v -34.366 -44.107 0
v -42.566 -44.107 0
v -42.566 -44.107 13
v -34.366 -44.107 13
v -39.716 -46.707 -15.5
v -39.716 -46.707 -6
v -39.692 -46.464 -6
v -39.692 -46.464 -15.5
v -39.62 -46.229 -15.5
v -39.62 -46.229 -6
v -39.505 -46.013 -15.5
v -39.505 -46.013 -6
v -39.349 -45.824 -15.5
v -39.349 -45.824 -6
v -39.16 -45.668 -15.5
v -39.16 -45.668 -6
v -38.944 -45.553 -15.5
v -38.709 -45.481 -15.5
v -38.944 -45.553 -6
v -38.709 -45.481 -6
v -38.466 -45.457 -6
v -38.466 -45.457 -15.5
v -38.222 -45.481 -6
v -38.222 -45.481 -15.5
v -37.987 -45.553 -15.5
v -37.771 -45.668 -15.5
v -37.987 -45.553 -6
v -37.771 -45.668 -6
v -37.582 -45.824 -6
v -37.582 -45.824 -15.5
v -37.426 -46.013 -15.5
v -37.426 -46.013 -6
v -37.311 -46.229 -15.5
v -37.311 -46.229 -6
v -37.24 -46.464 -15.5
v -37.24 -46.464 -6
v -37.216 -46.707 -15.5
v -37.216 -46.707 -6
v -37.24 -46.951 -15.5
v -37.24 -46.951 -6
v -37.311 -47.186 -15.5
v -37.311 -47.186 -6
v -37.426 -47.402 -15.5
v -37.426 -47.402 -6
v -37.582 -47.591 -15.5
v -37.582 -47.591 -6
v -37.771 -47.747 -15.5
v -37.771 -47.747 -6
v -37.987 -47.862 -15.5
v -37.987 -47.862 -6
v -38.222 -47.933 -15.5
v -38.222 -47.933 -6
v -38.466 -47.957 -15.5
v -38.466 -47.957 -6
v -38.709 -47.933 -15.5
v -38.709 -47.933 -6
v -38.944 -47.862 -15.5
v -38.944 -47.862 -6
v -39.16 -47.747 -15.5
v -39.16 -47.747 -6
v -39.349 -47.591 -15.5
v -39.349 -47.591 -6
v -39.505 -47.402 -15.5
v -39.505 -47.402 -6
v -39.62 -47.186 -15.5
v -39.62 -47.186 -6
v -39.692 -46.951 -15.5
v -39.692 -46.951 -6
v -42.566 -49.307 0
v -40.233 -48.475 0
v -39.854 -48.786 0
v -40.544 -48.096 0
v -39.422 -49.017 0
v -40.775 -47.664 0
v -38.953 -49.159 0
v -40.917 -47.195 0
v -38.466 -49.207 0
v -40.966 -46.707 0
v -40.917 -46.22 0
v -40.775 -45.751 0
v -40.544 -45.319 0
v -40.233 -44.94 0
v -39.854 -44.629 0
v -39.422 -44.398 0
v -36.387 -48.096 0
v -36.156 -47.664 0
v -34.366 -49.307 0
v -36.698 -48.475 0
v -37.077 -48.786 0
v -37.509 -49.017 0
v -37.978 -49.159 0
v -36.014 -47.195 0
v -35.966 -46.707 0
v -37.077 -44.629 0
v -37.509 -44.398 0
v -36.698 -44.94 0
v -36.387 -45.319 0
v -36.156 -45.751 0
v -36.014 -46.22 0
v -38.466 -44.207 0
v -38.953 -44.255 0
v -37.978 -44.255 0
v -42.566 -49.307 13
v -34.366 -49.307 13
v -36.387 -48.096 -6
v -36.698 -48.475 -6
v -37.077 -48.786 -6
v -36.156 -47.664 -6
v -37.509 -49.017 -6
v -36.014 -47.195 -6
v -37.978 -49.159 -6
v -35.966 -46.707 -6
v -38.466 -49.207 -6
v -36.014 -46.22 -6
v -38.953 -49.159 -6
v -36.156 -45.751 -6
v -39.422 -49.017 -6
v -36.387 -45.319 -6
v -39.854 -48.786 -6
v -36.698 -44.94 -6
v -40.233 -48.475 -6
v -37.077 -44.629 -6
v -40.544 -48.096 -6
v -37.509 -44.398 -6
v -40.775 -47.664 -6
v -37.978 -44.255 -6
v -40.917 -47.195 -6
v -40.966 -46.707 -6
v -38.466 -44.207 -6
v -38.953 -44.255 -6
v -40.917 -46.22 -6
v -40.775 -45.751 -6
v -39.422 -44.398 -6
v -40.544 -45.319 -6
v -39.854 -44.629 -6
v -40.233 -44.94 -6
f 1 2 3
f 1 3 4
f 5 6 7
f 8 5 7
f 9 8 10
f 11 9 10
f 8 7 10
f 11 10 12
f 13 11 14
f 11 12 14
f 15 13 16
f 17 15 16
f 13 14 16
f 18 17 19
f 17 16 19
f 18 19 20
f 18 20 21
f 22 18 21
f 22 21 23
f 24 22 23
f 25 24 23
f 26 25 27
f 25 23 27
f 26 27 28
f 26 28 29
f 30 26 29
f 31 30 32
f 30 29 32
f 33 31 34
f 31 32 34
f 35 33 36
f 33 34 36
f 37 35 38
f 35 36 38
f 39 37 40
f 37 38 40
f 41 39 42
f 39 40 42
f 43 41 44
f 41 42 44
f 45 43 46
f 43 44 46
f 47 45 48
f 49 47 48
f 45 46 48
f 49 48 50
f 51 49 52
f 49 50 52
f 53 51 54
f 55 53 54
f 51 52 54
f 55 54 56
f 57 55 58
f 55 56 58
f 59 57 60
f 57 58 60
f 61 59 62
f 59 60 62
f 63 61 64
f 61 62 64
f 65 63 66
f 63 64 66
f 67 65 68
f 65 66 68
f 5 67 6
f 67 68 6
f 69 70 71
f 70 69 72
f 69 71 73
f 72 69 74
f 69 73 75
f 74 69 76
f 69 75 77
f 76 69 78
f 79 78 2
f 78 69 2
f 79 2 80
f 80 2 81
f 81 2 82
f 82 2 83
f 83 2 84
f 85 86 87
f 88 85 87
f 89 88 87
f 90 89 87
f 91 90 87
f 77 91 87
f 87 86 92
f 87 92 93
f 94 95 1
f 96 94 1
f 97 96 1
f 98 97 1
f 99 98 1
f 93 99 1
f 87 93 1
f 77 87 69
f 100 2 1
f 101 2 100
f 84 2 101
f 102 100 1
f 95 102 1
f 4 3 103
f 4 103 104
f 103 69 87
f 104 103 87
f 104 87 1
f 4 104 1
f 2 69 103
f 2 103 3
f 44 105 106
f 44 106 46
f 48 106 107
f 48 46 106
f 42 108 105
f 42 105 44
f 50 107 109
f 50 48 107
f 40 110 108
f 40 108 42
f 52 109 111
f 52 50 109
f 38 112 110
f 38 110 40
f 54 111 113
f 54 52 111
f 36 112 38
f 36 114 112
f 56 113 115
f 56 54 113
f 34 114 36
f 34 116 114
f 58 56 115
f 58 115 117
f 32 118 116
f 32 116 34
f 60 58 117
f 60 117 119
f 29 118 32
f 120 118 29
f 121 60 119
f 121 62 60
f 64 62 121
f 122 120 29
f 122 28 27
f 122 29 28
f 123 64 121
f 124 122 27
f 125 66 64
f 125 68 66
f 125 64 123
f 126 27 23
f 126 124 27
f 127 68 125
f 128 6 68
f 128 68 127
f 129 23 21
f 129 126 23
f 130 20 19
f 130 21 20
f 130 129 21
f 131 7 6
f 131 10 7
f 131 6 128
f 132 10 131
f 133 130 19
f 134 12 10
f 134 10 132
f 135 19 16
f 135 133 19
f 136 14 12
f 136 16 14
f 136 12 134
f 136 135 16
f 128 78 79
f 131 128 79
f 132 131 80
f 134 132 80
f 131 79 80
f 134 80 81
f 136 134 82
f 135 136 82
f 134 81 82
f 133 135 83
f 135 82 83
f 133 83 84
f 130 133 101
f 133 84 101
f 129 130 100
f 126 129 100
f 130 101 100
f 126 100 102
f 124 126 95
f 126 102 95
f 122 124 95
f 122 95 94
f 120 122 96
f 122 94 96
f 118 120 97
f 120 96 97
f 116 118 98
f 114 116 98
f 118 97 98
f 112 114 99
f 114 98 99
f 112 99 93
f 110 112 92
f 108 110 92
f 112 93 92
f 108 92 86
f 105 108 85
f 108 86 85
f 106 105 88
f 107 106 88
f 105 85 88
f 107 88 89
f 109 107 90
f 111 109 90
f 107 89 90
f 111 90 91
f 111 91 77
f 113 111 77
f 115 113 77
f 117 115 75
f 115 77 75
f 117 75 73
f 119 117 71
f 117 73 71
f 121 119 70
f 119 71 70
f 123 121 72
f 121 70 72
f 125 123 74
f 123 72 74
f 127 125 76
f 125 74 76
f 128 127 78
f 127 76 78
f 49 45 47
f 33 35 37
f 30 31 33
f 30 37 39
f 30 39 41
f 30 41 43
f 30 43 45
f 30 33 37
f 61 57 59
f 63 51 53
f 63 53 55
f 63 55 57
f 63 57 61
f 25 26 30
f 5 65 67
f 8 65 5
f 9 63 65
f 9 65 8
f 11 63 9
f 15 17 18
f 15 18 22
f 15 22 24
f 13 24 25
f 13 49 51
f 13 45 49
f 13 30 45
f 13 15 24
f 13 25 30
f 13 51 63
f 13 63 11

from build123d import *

# Parameters (mm, degrees)
SKETCH_1_W      = 8.2
SKETCH_1_H      = 5.2
EXTRUDE_1_DEPTH = 13
SKETCH_2_R      = 2.5
EXTRUDE_2_DEPTH = 6
SKETCH_3_R      = 1.25
EXTRUDE_3_DEPTH = 9.5


with BuildPart() as part:
    # 草圖1 → 填料-伸長1 (new body)
    with BuildSketch(Plane.XY):
        with Locations((-38.465519845, -46.707444045)):
            Rectangle(SKETCH_1_W, SKETCH_1_H)
    extrude(amount=EXTRUDE_1_DEPTH)

    # 草圖2 → 填料-伸長2 (add)
    with BuildSketch(Plane(origin=(0, 0, 0), x_dir=(-1, 0, 0), z_dir=(0, 0, -1))):
        with Locations((38.465519845, -46.707444045)):
            Circle(SKETCH_2_R)
    extrude(amount=EXTRUDE_2_DEPTH)

    # 草圖3 → 填料-伸長3 (add)
    with BuildSketch(Plane(origin=(0, 0, -6), x_dir=(-1, 0, 0), z_dir=(0, 0, -1))):
        with Locations((38.465519845, -46.707444045)):
            Circle(SKETCH_3_R)
    extrude(amount=EXTRUDE_3_DEPTH)


solid = part.part
